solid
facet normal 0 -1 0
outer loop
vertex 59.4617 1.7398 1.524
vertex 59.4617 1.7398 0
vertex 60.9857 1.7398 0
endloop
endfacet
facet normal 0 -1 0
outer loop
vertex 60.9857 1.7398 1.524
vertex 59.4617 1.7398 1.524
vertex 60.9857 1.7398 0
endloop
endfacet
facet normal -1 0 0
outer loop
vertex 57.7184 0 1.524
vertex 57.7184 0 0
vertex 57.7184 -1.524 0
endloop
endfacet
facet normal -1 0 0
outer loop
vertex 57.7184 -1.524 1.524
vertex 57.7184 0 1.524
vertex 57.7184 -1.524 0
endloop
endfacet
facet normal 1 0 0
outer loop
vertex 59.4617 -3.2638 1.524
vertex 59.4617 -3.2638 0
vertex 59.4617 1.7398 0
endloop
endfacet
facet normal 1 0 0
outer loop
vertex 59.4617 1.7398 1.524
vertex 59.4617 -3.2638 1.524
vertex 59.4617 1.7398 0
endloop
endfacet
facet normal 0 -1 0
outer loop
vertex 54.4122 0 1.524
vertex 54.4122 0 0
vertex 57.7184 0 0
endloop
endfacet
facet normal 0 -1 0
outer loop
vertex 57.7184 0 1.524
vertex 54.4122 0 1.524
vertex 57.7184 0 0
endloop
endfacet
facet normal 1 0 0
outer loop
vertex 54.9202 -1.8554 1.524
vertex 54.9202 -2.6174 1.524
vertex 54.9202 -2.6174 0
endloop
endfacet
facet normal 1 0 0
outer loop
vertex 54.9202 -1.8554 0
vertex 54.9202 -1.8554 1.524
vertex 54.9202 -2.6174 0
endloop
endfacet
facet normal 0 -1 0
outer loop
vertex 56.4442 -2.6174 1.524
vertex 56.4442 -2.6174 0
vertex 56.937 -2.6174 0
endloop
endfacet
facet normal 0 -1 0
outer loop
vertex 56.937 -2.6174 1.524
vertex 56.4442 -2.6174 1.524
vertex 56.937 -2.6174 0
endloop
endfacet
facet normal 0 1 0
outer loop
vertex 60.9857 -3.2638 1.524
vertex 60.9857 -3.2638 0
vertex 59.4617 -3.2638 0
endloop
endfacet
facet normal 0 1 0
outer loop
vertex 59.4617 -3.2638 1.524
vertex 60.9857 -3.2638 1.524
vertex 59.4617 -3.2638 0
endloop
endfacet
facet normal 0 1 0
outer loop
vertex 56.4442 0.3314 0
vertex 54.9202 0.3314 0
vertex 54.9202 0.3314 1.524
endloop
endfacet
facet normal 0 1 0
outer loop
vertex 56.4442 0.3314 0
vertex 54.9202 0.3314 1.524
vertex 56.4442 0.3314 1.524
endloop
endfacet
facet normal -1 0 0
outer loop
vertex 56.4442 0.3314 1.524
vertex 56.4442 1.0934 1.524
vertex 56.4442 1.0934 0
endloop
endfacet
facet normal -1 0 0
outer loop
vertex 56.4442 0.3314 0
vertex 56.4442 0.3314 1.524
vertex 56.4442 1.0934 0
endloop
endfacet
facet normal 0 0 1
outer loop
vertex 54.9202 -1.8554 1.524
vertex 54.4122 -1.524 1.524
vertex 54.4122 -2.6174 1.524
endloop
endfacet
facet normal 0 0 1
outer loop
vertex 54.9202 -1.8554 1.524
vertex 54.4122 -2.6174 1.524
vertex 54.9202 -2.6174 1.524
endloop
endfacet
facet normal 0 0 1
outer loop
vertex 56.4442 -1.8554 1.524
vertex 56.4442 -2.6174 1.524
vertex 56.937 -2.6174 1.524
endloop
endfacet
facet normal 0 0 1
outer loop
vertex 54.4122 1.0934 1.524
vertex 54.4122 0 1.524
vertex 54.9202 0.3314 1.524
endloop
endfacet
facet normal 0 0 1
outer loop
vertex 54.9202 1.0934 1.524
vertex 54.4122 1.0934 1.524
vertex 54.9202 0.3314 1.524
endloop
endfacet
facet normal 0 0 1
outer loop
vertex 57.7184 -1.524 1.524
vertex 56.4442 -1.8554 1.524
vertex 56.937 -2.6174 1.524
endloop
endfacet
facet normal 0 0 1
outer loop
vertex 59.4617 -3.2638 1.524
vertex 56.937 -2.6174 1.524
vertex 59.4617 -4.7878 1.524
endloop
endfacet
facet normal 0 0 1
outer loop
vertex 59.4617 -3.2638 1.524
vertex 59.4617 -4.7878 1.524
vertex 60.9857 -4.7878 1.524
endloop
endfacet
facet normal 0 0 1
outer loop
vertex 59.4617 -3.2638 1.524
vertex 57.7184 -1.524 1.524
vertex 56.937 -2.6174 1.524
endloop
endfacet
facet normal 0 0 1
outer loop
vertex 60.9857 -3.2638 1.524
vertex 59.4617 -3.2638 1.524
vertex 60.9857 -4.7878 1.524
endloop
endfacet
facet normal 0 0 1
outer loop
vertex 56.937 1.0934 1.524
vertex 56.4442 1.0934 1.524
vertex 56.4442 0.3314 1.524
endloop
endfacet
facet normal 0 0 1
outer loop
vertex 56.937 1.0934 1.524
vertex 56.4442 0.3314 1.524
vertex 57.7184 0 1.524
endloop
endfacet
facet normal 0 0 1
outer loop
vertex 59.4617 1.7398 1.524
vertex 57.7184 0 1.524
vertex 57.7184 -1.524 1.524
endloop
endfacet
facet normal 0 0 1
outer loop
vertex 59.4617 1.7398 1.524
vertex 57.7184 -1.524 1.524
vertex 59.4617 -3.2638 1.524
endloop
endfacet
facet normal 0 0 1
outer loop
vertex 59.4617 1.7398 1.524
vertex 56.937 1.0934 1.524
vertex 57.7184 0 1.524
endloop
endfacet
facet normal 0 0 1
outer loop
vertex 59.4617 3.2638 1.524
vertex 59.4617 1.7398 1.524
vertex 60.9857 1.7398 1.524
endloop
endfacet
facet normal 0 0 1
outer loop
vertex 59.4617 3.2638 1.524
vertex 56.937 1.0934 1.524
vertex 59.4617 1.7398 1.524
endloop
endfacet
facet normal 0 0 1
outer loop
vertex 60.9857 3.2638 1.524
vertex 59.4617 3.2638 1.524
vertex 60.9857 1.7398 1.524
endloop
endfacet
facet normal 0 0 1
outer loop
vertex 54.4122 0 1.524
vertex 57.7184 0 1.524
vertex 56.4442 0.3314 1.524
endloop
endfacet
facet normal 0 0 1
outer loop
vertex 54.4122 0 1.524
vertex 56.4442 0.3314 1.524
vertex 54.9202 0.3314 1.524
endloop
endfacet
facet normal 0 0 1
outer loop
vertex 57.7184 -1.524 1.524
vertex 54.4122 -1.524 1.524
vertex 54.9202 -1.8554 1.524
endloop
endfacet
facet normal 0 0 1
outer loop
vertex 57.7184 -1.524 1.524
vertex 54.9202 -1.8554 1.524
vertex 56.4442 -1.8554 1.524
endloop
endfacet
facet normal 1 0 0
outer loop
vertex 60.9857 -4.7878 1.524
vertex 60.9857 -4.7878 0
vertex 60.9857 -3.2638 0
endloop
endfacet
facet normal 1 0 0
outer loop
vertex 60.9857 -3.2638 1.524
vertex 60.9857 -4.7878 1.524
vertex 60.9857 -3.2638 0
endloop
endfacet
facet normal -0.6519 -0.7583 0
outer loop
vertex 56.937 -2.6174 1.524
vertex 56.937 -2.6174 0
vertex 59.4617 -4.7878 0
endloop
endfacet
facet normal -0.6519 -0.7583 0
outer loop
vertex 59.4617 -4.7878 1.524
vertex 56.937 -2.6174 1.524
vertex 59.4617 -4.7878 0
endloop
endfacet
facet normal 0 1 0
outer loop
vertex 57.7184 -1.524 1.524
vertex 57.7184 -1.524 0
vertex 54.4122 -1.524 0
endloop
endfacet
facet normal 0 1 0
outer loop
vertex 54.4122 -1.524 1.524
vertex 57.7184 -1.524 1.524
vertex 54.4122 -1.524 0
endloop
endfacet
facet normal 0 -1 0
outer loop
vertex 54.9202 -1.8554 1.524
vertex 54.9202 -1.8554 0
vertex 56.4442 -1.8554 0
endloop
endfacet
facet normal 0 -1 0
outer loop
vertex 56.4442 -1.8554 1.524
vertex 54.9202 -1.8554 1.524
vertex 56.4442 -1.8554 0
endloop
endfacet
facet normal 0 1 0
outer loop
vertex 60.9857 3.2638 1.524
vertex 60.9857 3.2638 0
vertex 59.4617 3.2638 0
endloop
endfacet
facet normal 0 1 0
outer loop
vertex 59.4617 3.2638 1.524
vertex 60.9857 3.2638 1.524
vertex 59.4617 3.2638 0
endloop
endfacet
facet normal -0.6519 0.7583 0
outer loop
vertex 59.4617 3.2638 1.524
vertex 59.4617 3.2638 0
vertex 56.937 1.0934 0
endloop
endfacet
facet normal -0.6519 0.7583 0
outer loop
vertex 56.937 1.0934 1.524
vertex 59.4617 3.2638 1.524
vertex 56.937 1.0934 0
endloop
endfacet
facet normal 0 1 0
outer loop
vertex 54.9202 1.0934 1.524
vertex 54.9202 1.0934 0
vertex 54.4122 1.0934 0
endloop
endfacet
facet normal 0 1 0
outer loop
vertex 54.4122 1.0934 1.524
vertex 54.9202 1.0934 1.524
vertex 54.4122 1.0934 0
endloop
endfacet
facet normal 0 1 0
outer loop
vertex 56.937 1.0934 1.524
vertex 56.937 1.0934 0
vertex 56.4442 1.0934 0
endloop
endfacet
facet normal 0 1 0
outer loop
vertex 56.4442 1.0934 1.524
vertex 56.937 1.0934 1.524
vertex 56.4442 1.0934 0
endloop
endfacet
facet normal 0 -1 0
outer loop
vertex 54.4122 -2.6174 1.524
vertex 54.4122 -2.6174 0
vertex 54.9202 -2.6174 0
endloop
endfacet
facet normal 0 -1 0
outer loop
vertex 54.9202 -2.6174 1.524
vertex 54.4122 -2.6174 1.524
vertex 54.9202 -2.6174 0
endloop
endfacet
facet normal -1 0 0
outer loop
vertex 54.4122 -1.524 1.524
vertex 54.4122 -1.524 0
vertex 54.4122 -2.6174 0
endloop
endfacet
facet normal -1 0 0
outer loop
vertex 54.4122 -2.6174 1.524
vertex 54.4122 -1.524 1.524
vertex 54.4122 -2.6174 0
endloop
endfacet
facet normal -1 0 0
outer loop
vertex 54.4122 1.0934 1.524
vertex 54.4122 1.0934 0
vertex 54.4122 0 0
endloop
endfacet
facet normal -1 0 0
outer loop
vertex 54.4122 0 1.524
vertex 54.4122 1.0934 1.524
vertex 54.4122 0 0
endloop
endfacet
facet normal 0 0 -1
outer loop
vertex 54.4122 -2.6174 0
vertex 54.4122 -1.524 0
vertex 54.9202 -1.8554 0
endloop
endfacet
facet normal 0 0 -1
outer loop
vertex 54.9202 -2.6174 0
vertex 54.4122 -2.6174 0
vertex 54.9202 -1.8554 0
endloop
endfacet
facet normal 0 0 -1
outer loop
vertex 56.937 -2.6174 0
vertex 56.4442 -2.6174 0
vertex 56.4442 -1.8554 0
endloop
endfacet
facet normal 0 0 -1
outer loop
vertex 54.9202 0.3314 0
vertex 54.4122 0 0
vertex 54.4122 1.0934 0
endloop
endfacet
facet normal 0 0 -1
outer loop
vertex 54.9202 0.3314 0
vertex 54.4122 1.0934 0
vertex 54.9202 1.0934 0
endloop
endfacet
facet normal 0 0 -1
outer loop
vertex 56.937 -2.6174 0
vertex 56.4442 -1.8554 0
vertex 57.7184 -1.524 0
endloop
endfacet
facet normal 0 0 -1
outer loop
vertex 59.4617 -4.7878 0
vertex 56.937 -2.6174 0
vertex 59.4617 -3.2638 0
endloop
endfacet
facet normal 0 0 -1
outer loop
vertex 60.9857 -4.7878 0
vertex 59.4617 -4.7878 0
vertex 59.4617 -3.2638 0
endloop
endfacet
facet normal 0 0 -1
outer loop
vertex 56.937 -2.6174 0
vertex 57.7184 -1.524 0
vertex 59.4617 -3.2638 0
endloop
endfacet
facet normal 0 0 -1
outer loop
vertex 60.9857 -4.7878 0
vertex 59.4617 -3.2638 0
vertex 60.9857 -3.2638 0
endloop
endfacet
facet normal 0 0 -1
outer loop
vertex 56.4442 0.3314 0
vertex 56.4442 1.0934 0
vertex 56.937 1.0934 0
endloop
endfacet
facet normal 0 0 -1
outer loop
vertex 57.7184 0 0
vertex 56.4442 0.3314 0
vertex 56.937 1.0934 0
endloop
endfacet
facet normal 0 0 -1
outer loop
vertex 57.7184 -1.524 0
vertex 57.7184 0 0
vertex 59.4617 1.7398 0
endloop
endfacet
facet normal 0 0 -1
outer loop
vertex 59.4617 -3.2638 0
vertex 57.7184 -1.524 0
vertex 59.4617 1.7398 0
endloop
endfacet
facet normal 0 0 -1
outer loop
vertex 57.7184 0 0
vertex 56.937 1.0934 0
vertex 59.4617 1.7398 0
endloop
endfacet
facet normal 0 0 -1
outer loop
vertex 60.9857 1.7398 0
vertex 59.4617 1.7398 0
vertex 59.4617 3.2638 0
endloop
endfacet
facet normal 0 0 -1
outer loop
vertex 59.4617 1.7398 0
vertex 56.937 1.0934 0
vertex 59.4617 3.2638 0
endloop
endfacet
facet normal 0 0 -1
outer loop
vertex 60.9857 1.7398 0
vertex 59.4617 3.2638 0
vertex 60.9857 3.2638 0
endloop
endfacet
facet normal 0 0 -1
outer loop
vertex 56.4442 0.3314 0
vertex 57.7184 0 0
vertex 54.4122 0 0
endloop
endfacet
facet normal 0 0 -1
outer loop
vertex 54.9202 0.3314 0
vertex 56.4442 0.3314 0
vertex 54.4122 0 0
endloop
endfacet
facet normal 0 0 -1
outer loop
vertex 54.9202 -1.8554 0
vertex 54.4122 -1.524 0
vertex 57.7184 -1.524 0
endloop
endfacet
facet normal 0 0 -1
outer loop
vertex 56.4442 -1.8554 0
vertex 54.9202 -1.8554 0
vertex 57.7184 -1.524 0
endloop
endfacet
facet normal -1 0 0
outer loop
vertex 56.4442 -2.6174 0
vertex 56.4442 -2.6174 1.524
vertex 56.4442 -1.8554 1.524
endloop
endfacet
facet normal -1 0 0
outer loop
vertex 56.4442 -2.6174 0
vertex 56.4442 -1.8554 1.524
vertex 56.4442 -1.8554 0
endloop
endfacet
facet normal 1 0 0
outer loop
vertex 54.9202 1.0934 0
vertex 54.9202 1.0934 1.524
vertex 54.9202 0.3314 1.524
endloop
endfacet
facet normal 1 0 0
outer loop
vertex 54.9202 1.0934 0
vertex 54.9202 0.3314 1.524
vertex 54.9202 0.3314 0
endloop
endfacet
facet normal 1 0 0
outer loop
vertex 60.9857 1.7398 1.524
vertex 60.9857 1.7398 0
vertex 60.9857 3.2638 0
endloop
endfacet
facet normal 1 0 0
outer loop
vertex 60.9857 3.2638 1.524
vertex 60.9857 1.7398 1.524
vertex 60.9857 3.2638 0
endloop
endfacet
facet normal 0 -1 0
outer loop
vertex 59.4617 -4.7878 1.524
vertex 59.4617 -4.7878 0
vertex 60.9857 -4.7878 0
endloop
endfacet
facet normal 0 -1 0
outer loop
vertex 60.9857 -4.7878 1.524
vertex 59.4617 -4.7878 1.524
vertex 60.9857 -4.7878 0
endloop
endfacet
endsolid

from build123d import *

# Parameters (mm, degrees)
BOSS_EXTRUDE1_DEPTH = 1.524
SKETCH3_W           = 1.524
SKETCH3_H           = 1.524
CUT_EXTRUDE1_DEPTH  = 0.762


with BuildPart() as part:
    # Sketch1 → Boss-Extrude1 (new body)
    with BuildSketch(Plane.XY):
        Polygon((57.718435694, 0), (57.718435694, -1.524), (54.412176394, -1.524), (54.412176394, -2.617357602), (56.936958373, -2.617357602), (59.461740351, -4.787750638), (60.985740351, -4.787750638), (60.985740351, -3.263750638), (59.461740351, -3.263750638), (59.461740351, 1.739750638), (60.985740351, 1.739750638), (60.985740351, 3.263750638), (59.461740351, 3.263750638), (56.936958373, 1.093357602), (54.412176394, 1.093357602), (54.412176394, 0), align=None)
    extrude(amount=BOSS_EXTRUDE1_DEPTH)

    # Sketch3 → Cut-Extrude1 (cut)
    with BuildSketch(Plane(origin=(0, 1.093357602, 0), x_dir=(1, 0, 0), z_dir=(0, 1, 0))):
        with Locations((55.682176394, -0.762)):
            Rectangle(SKETCH3_W, SKETCH3_H)
    cut_extrude1 = extrude(amount=-CUT_EXTRUDE1_DEPTH, mode=Mode.SUBTRACT)

    # Mirror1: Cut-Extrude1 across plane
    add(cut_extrude1.mirror(Plane.ZX.offset(-0.762)), mode=Mode.SUBTRACT)


solid = part.part
